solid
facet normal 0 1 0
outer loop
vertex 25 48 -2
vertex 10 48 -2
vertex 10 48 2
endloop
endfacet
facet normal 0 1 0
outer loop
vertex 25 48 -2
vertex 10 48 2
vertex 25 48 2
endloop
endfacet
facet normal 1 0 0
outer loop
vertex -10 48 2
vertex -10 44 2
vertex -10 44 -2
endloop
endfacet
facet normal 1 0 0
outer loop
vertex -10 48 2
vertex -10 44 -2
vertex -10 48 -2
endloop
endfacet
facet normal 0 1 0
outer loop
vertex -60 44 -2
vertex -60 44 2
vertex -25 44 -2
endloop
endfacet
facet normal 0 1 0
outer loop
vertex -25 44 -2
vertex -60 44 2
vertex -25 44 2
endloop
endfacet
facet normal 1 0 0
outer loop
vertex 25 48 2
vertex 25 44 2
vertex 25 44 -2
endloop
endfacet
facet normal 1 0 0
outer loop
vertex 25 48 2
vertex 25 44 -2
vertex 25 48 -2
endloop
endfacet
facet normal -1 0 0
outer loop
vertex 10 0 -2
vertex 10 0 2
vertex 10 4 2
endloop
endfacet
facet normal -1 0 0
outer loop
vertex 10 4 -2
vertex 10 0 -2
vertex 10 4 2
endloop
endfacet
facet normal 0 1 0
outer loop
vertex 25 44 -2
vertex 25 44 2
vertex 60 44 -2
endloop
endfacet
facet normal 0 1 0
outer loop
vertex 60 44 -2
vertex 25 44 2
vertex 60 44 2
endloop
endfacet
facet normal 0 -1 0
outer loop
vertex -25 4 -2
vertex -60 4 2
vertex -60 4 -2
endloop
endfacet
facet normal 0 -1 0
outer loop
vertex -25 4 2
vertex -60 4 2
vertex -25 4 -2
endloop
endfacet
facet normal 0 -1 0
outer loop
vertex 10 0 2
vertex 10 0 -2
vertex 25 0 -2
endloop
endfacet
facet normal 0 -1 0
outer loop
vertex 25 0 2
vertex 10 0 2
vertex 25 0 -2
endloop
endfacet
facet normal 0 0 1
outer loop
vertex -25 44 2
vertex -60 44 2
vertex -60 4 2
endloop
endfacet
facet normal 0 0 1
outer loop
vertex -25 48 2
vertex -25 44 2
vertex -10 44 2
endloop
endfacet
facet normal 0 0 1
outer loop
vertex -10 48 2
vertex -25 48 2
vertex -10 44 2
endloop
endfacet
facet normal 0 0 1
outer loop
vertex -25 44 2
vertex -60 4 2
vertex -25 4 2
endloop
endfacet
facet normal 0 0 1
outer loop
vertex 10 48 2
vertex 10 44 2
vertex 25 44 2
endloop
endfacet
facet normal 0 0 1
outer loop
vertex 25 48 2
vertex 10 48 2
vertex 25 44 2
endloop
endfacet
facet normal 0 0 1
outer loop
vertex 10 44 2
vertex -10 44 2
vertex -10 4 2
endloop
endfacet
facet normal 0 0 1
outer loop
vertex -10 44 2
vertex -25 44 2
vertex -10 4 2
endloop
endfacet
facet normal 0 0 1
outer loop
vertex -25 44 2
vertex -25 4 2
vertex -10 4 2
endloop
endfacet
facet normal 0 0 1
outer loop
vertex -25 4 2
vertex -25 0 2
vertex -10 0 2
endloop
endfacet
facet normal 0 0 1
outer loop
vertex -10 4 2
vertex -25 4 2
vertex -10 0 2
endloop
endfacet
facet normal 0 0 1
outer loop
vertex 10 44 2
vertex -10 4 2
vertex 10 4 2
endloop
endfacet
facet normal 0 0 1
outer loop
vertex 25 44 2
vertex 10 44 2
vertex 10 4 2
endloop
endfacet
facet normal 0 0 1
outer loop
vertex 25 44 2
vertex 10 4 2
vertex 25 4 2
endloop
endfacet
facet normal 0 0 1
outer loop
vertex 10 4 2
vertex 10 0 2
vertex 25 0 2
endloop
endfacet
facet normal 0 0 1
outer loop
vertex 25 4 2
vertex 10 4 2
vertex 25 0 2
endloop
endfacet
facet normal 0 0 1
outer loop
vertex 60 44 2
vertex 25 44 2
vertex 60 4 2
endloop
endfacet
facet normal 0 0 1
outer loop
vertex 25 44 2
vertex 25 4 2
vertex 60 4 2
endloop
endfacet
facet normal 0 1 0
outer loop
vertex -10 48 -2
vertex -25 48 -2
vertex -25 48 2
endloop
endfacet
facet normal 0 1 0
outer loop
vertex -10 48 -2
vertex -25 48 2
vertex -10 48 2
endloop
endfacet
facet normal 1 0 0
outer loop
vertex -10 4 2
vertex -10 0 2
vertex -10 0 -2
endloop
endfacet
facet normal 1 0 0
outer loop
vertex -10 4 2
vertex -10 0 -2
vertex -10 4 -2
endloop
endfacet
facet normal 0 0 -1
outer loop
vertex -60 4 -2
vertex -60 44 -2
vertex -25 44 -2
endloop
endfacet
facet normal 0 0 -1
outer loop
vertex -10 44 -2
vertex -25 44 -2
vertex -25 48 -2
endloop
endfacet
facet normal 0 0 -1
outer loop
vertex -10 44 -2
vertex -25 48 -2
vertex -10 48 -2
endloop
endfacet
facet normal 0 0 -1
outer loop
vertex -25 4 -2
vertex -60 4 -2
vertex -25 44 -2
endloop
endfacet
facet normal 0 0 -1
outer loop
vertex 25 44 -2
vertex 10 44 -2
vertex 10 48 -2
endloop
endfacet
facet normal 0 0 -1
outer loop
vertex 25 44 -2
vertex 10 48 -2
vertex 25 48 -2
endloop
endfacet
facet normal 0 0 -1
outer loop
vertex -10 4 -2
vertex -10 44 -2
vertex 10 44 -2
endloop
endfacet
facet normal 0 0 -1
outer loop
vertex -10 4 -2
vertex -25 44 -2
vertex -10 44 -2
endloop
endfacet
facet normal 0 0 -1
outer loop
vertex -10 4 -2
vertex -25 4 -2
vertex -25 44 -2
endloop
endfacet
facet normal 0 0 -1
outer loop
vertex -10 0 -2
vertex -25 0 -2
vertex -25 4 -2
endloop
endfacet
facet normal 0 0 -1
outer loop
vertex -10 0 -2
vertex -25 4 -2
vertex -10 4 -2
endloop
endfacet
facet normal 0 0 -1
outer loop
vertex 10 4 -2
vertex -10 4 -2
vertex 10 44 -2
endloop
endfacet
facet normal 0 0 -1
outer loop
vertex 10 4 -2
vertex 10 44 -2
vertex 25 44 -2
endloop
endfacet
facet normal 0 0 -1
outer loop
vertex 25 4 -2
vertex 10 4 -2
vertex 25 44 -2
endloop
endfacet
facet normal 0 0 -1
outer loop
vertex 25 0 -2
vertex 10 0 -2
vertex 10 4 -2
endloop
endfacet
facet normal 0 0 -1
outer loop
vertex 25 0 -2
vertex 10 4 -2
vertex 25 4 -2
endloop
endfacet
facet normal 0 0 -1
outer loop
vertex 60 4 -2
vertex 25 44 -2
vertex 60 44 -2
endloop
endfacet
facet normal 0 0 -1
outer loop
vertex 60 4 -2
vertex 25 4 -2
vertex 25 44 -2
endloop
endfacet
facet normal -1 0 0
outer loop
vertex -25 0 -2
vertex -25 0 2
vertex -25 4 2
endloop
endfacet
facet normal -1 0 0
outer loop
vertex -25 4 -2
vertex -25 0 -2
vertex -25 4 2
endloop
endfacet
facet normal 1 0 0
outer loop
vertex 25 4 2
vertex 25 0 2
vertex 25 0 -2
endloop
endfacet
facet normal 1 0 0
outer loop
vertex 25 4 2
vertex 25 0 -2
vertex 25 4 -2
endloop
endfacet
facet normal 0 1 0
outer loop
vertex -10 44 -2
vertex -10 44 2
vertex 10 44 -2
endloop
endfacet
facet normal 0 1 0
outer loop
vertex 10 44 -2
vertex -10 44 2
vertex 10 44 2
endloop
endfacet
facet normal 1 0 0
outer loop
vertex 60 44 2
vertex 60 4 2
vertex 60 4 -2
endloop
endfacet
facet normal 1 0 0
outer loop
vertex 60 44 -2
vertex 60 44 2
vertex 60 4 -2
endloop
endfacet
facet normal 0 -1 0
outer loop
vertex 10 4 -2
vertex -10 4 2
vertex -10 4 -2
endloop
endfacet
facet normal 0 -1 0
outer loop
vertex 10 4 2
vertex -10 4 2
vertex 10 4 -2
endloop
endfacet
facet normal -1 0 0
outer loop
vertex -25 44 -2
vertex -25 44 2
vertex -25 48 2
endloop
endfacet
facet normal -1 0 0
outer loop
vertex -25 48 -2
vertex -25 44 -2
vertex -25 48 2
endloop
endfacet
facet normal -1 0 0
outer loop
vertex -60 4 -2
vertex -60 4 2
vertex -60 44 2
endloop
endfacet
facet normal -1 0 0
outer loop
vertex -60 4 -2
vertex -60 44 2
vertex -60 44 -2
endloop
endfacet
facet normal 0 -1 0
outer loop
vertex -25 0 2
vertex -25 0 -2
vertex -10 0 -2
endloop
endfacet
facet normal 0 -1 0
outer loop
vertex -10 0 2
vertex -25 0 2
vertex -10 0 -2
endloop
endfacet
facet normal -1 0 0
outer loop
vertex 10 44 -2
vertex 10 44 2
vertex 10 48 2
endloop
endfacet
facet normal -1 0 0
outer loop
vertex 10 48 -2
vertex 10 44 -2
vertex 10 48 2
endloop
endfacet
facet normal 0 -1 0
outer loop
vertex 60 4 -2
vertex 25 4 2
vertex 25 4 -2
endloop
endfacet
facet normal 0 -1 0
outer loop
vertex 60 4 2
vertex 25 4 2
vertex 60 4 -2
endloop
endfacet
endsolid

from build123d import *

# Parameters (mm, degrees)
SKETCH1_W           = 120
SKETCH1_H           = 4
BOSS_EXTRUDE3_DEPTH = 48
SKETCH4_W           = 35
SKETCH4_H           = 4
SKETCH4_W_2         = 20
CUT_EXTRUDE2_DEPTH  = 48


with BuildPart() as part:
    # Sketch1 → Boss-Extrude3 (new body)
    with BuildSketch(Plane(origin=(0, 0, 0), x_dir=(1, 0, 0), z_dir=(0, 1, 0))):
        Rectangle(SKETCH1_W, SKETCH1_H)
    extrude(amount=BOSS_EXTRUDE3_DEPTH)

    # Sketch4 → Cut-Extrude2 (cut)
    with BuildSketch(Plane.XY.offset(2)):
        with Locations((-42.5, 46)):
            Rectangle(SKETCH4_W, SKETCH4_H)
        with Locations((0, 46)):
            Rectangle(SKETCH4_W_2, SKETCH4_H)
        with Locations((42.5, 46)):
            Rectangle(SKETCH4_W, SKETCH4_H)
        with Locations((-42.5, 2)):
            Rectangle(SKETCH4_W, SKETCH4_H)
        with Locations((0, 2)):
            Rectangle(SKETCH4_W_2, SKETCH4_H)
        with Locations((42.5, 2)):
            Rectangle(SKETCH4_W, SKETCH4_H)
    extrude(amount=-CUT_EXTRUDE2_DEPTH, mode=Mode.SUBTRACT)


solid = part.part
